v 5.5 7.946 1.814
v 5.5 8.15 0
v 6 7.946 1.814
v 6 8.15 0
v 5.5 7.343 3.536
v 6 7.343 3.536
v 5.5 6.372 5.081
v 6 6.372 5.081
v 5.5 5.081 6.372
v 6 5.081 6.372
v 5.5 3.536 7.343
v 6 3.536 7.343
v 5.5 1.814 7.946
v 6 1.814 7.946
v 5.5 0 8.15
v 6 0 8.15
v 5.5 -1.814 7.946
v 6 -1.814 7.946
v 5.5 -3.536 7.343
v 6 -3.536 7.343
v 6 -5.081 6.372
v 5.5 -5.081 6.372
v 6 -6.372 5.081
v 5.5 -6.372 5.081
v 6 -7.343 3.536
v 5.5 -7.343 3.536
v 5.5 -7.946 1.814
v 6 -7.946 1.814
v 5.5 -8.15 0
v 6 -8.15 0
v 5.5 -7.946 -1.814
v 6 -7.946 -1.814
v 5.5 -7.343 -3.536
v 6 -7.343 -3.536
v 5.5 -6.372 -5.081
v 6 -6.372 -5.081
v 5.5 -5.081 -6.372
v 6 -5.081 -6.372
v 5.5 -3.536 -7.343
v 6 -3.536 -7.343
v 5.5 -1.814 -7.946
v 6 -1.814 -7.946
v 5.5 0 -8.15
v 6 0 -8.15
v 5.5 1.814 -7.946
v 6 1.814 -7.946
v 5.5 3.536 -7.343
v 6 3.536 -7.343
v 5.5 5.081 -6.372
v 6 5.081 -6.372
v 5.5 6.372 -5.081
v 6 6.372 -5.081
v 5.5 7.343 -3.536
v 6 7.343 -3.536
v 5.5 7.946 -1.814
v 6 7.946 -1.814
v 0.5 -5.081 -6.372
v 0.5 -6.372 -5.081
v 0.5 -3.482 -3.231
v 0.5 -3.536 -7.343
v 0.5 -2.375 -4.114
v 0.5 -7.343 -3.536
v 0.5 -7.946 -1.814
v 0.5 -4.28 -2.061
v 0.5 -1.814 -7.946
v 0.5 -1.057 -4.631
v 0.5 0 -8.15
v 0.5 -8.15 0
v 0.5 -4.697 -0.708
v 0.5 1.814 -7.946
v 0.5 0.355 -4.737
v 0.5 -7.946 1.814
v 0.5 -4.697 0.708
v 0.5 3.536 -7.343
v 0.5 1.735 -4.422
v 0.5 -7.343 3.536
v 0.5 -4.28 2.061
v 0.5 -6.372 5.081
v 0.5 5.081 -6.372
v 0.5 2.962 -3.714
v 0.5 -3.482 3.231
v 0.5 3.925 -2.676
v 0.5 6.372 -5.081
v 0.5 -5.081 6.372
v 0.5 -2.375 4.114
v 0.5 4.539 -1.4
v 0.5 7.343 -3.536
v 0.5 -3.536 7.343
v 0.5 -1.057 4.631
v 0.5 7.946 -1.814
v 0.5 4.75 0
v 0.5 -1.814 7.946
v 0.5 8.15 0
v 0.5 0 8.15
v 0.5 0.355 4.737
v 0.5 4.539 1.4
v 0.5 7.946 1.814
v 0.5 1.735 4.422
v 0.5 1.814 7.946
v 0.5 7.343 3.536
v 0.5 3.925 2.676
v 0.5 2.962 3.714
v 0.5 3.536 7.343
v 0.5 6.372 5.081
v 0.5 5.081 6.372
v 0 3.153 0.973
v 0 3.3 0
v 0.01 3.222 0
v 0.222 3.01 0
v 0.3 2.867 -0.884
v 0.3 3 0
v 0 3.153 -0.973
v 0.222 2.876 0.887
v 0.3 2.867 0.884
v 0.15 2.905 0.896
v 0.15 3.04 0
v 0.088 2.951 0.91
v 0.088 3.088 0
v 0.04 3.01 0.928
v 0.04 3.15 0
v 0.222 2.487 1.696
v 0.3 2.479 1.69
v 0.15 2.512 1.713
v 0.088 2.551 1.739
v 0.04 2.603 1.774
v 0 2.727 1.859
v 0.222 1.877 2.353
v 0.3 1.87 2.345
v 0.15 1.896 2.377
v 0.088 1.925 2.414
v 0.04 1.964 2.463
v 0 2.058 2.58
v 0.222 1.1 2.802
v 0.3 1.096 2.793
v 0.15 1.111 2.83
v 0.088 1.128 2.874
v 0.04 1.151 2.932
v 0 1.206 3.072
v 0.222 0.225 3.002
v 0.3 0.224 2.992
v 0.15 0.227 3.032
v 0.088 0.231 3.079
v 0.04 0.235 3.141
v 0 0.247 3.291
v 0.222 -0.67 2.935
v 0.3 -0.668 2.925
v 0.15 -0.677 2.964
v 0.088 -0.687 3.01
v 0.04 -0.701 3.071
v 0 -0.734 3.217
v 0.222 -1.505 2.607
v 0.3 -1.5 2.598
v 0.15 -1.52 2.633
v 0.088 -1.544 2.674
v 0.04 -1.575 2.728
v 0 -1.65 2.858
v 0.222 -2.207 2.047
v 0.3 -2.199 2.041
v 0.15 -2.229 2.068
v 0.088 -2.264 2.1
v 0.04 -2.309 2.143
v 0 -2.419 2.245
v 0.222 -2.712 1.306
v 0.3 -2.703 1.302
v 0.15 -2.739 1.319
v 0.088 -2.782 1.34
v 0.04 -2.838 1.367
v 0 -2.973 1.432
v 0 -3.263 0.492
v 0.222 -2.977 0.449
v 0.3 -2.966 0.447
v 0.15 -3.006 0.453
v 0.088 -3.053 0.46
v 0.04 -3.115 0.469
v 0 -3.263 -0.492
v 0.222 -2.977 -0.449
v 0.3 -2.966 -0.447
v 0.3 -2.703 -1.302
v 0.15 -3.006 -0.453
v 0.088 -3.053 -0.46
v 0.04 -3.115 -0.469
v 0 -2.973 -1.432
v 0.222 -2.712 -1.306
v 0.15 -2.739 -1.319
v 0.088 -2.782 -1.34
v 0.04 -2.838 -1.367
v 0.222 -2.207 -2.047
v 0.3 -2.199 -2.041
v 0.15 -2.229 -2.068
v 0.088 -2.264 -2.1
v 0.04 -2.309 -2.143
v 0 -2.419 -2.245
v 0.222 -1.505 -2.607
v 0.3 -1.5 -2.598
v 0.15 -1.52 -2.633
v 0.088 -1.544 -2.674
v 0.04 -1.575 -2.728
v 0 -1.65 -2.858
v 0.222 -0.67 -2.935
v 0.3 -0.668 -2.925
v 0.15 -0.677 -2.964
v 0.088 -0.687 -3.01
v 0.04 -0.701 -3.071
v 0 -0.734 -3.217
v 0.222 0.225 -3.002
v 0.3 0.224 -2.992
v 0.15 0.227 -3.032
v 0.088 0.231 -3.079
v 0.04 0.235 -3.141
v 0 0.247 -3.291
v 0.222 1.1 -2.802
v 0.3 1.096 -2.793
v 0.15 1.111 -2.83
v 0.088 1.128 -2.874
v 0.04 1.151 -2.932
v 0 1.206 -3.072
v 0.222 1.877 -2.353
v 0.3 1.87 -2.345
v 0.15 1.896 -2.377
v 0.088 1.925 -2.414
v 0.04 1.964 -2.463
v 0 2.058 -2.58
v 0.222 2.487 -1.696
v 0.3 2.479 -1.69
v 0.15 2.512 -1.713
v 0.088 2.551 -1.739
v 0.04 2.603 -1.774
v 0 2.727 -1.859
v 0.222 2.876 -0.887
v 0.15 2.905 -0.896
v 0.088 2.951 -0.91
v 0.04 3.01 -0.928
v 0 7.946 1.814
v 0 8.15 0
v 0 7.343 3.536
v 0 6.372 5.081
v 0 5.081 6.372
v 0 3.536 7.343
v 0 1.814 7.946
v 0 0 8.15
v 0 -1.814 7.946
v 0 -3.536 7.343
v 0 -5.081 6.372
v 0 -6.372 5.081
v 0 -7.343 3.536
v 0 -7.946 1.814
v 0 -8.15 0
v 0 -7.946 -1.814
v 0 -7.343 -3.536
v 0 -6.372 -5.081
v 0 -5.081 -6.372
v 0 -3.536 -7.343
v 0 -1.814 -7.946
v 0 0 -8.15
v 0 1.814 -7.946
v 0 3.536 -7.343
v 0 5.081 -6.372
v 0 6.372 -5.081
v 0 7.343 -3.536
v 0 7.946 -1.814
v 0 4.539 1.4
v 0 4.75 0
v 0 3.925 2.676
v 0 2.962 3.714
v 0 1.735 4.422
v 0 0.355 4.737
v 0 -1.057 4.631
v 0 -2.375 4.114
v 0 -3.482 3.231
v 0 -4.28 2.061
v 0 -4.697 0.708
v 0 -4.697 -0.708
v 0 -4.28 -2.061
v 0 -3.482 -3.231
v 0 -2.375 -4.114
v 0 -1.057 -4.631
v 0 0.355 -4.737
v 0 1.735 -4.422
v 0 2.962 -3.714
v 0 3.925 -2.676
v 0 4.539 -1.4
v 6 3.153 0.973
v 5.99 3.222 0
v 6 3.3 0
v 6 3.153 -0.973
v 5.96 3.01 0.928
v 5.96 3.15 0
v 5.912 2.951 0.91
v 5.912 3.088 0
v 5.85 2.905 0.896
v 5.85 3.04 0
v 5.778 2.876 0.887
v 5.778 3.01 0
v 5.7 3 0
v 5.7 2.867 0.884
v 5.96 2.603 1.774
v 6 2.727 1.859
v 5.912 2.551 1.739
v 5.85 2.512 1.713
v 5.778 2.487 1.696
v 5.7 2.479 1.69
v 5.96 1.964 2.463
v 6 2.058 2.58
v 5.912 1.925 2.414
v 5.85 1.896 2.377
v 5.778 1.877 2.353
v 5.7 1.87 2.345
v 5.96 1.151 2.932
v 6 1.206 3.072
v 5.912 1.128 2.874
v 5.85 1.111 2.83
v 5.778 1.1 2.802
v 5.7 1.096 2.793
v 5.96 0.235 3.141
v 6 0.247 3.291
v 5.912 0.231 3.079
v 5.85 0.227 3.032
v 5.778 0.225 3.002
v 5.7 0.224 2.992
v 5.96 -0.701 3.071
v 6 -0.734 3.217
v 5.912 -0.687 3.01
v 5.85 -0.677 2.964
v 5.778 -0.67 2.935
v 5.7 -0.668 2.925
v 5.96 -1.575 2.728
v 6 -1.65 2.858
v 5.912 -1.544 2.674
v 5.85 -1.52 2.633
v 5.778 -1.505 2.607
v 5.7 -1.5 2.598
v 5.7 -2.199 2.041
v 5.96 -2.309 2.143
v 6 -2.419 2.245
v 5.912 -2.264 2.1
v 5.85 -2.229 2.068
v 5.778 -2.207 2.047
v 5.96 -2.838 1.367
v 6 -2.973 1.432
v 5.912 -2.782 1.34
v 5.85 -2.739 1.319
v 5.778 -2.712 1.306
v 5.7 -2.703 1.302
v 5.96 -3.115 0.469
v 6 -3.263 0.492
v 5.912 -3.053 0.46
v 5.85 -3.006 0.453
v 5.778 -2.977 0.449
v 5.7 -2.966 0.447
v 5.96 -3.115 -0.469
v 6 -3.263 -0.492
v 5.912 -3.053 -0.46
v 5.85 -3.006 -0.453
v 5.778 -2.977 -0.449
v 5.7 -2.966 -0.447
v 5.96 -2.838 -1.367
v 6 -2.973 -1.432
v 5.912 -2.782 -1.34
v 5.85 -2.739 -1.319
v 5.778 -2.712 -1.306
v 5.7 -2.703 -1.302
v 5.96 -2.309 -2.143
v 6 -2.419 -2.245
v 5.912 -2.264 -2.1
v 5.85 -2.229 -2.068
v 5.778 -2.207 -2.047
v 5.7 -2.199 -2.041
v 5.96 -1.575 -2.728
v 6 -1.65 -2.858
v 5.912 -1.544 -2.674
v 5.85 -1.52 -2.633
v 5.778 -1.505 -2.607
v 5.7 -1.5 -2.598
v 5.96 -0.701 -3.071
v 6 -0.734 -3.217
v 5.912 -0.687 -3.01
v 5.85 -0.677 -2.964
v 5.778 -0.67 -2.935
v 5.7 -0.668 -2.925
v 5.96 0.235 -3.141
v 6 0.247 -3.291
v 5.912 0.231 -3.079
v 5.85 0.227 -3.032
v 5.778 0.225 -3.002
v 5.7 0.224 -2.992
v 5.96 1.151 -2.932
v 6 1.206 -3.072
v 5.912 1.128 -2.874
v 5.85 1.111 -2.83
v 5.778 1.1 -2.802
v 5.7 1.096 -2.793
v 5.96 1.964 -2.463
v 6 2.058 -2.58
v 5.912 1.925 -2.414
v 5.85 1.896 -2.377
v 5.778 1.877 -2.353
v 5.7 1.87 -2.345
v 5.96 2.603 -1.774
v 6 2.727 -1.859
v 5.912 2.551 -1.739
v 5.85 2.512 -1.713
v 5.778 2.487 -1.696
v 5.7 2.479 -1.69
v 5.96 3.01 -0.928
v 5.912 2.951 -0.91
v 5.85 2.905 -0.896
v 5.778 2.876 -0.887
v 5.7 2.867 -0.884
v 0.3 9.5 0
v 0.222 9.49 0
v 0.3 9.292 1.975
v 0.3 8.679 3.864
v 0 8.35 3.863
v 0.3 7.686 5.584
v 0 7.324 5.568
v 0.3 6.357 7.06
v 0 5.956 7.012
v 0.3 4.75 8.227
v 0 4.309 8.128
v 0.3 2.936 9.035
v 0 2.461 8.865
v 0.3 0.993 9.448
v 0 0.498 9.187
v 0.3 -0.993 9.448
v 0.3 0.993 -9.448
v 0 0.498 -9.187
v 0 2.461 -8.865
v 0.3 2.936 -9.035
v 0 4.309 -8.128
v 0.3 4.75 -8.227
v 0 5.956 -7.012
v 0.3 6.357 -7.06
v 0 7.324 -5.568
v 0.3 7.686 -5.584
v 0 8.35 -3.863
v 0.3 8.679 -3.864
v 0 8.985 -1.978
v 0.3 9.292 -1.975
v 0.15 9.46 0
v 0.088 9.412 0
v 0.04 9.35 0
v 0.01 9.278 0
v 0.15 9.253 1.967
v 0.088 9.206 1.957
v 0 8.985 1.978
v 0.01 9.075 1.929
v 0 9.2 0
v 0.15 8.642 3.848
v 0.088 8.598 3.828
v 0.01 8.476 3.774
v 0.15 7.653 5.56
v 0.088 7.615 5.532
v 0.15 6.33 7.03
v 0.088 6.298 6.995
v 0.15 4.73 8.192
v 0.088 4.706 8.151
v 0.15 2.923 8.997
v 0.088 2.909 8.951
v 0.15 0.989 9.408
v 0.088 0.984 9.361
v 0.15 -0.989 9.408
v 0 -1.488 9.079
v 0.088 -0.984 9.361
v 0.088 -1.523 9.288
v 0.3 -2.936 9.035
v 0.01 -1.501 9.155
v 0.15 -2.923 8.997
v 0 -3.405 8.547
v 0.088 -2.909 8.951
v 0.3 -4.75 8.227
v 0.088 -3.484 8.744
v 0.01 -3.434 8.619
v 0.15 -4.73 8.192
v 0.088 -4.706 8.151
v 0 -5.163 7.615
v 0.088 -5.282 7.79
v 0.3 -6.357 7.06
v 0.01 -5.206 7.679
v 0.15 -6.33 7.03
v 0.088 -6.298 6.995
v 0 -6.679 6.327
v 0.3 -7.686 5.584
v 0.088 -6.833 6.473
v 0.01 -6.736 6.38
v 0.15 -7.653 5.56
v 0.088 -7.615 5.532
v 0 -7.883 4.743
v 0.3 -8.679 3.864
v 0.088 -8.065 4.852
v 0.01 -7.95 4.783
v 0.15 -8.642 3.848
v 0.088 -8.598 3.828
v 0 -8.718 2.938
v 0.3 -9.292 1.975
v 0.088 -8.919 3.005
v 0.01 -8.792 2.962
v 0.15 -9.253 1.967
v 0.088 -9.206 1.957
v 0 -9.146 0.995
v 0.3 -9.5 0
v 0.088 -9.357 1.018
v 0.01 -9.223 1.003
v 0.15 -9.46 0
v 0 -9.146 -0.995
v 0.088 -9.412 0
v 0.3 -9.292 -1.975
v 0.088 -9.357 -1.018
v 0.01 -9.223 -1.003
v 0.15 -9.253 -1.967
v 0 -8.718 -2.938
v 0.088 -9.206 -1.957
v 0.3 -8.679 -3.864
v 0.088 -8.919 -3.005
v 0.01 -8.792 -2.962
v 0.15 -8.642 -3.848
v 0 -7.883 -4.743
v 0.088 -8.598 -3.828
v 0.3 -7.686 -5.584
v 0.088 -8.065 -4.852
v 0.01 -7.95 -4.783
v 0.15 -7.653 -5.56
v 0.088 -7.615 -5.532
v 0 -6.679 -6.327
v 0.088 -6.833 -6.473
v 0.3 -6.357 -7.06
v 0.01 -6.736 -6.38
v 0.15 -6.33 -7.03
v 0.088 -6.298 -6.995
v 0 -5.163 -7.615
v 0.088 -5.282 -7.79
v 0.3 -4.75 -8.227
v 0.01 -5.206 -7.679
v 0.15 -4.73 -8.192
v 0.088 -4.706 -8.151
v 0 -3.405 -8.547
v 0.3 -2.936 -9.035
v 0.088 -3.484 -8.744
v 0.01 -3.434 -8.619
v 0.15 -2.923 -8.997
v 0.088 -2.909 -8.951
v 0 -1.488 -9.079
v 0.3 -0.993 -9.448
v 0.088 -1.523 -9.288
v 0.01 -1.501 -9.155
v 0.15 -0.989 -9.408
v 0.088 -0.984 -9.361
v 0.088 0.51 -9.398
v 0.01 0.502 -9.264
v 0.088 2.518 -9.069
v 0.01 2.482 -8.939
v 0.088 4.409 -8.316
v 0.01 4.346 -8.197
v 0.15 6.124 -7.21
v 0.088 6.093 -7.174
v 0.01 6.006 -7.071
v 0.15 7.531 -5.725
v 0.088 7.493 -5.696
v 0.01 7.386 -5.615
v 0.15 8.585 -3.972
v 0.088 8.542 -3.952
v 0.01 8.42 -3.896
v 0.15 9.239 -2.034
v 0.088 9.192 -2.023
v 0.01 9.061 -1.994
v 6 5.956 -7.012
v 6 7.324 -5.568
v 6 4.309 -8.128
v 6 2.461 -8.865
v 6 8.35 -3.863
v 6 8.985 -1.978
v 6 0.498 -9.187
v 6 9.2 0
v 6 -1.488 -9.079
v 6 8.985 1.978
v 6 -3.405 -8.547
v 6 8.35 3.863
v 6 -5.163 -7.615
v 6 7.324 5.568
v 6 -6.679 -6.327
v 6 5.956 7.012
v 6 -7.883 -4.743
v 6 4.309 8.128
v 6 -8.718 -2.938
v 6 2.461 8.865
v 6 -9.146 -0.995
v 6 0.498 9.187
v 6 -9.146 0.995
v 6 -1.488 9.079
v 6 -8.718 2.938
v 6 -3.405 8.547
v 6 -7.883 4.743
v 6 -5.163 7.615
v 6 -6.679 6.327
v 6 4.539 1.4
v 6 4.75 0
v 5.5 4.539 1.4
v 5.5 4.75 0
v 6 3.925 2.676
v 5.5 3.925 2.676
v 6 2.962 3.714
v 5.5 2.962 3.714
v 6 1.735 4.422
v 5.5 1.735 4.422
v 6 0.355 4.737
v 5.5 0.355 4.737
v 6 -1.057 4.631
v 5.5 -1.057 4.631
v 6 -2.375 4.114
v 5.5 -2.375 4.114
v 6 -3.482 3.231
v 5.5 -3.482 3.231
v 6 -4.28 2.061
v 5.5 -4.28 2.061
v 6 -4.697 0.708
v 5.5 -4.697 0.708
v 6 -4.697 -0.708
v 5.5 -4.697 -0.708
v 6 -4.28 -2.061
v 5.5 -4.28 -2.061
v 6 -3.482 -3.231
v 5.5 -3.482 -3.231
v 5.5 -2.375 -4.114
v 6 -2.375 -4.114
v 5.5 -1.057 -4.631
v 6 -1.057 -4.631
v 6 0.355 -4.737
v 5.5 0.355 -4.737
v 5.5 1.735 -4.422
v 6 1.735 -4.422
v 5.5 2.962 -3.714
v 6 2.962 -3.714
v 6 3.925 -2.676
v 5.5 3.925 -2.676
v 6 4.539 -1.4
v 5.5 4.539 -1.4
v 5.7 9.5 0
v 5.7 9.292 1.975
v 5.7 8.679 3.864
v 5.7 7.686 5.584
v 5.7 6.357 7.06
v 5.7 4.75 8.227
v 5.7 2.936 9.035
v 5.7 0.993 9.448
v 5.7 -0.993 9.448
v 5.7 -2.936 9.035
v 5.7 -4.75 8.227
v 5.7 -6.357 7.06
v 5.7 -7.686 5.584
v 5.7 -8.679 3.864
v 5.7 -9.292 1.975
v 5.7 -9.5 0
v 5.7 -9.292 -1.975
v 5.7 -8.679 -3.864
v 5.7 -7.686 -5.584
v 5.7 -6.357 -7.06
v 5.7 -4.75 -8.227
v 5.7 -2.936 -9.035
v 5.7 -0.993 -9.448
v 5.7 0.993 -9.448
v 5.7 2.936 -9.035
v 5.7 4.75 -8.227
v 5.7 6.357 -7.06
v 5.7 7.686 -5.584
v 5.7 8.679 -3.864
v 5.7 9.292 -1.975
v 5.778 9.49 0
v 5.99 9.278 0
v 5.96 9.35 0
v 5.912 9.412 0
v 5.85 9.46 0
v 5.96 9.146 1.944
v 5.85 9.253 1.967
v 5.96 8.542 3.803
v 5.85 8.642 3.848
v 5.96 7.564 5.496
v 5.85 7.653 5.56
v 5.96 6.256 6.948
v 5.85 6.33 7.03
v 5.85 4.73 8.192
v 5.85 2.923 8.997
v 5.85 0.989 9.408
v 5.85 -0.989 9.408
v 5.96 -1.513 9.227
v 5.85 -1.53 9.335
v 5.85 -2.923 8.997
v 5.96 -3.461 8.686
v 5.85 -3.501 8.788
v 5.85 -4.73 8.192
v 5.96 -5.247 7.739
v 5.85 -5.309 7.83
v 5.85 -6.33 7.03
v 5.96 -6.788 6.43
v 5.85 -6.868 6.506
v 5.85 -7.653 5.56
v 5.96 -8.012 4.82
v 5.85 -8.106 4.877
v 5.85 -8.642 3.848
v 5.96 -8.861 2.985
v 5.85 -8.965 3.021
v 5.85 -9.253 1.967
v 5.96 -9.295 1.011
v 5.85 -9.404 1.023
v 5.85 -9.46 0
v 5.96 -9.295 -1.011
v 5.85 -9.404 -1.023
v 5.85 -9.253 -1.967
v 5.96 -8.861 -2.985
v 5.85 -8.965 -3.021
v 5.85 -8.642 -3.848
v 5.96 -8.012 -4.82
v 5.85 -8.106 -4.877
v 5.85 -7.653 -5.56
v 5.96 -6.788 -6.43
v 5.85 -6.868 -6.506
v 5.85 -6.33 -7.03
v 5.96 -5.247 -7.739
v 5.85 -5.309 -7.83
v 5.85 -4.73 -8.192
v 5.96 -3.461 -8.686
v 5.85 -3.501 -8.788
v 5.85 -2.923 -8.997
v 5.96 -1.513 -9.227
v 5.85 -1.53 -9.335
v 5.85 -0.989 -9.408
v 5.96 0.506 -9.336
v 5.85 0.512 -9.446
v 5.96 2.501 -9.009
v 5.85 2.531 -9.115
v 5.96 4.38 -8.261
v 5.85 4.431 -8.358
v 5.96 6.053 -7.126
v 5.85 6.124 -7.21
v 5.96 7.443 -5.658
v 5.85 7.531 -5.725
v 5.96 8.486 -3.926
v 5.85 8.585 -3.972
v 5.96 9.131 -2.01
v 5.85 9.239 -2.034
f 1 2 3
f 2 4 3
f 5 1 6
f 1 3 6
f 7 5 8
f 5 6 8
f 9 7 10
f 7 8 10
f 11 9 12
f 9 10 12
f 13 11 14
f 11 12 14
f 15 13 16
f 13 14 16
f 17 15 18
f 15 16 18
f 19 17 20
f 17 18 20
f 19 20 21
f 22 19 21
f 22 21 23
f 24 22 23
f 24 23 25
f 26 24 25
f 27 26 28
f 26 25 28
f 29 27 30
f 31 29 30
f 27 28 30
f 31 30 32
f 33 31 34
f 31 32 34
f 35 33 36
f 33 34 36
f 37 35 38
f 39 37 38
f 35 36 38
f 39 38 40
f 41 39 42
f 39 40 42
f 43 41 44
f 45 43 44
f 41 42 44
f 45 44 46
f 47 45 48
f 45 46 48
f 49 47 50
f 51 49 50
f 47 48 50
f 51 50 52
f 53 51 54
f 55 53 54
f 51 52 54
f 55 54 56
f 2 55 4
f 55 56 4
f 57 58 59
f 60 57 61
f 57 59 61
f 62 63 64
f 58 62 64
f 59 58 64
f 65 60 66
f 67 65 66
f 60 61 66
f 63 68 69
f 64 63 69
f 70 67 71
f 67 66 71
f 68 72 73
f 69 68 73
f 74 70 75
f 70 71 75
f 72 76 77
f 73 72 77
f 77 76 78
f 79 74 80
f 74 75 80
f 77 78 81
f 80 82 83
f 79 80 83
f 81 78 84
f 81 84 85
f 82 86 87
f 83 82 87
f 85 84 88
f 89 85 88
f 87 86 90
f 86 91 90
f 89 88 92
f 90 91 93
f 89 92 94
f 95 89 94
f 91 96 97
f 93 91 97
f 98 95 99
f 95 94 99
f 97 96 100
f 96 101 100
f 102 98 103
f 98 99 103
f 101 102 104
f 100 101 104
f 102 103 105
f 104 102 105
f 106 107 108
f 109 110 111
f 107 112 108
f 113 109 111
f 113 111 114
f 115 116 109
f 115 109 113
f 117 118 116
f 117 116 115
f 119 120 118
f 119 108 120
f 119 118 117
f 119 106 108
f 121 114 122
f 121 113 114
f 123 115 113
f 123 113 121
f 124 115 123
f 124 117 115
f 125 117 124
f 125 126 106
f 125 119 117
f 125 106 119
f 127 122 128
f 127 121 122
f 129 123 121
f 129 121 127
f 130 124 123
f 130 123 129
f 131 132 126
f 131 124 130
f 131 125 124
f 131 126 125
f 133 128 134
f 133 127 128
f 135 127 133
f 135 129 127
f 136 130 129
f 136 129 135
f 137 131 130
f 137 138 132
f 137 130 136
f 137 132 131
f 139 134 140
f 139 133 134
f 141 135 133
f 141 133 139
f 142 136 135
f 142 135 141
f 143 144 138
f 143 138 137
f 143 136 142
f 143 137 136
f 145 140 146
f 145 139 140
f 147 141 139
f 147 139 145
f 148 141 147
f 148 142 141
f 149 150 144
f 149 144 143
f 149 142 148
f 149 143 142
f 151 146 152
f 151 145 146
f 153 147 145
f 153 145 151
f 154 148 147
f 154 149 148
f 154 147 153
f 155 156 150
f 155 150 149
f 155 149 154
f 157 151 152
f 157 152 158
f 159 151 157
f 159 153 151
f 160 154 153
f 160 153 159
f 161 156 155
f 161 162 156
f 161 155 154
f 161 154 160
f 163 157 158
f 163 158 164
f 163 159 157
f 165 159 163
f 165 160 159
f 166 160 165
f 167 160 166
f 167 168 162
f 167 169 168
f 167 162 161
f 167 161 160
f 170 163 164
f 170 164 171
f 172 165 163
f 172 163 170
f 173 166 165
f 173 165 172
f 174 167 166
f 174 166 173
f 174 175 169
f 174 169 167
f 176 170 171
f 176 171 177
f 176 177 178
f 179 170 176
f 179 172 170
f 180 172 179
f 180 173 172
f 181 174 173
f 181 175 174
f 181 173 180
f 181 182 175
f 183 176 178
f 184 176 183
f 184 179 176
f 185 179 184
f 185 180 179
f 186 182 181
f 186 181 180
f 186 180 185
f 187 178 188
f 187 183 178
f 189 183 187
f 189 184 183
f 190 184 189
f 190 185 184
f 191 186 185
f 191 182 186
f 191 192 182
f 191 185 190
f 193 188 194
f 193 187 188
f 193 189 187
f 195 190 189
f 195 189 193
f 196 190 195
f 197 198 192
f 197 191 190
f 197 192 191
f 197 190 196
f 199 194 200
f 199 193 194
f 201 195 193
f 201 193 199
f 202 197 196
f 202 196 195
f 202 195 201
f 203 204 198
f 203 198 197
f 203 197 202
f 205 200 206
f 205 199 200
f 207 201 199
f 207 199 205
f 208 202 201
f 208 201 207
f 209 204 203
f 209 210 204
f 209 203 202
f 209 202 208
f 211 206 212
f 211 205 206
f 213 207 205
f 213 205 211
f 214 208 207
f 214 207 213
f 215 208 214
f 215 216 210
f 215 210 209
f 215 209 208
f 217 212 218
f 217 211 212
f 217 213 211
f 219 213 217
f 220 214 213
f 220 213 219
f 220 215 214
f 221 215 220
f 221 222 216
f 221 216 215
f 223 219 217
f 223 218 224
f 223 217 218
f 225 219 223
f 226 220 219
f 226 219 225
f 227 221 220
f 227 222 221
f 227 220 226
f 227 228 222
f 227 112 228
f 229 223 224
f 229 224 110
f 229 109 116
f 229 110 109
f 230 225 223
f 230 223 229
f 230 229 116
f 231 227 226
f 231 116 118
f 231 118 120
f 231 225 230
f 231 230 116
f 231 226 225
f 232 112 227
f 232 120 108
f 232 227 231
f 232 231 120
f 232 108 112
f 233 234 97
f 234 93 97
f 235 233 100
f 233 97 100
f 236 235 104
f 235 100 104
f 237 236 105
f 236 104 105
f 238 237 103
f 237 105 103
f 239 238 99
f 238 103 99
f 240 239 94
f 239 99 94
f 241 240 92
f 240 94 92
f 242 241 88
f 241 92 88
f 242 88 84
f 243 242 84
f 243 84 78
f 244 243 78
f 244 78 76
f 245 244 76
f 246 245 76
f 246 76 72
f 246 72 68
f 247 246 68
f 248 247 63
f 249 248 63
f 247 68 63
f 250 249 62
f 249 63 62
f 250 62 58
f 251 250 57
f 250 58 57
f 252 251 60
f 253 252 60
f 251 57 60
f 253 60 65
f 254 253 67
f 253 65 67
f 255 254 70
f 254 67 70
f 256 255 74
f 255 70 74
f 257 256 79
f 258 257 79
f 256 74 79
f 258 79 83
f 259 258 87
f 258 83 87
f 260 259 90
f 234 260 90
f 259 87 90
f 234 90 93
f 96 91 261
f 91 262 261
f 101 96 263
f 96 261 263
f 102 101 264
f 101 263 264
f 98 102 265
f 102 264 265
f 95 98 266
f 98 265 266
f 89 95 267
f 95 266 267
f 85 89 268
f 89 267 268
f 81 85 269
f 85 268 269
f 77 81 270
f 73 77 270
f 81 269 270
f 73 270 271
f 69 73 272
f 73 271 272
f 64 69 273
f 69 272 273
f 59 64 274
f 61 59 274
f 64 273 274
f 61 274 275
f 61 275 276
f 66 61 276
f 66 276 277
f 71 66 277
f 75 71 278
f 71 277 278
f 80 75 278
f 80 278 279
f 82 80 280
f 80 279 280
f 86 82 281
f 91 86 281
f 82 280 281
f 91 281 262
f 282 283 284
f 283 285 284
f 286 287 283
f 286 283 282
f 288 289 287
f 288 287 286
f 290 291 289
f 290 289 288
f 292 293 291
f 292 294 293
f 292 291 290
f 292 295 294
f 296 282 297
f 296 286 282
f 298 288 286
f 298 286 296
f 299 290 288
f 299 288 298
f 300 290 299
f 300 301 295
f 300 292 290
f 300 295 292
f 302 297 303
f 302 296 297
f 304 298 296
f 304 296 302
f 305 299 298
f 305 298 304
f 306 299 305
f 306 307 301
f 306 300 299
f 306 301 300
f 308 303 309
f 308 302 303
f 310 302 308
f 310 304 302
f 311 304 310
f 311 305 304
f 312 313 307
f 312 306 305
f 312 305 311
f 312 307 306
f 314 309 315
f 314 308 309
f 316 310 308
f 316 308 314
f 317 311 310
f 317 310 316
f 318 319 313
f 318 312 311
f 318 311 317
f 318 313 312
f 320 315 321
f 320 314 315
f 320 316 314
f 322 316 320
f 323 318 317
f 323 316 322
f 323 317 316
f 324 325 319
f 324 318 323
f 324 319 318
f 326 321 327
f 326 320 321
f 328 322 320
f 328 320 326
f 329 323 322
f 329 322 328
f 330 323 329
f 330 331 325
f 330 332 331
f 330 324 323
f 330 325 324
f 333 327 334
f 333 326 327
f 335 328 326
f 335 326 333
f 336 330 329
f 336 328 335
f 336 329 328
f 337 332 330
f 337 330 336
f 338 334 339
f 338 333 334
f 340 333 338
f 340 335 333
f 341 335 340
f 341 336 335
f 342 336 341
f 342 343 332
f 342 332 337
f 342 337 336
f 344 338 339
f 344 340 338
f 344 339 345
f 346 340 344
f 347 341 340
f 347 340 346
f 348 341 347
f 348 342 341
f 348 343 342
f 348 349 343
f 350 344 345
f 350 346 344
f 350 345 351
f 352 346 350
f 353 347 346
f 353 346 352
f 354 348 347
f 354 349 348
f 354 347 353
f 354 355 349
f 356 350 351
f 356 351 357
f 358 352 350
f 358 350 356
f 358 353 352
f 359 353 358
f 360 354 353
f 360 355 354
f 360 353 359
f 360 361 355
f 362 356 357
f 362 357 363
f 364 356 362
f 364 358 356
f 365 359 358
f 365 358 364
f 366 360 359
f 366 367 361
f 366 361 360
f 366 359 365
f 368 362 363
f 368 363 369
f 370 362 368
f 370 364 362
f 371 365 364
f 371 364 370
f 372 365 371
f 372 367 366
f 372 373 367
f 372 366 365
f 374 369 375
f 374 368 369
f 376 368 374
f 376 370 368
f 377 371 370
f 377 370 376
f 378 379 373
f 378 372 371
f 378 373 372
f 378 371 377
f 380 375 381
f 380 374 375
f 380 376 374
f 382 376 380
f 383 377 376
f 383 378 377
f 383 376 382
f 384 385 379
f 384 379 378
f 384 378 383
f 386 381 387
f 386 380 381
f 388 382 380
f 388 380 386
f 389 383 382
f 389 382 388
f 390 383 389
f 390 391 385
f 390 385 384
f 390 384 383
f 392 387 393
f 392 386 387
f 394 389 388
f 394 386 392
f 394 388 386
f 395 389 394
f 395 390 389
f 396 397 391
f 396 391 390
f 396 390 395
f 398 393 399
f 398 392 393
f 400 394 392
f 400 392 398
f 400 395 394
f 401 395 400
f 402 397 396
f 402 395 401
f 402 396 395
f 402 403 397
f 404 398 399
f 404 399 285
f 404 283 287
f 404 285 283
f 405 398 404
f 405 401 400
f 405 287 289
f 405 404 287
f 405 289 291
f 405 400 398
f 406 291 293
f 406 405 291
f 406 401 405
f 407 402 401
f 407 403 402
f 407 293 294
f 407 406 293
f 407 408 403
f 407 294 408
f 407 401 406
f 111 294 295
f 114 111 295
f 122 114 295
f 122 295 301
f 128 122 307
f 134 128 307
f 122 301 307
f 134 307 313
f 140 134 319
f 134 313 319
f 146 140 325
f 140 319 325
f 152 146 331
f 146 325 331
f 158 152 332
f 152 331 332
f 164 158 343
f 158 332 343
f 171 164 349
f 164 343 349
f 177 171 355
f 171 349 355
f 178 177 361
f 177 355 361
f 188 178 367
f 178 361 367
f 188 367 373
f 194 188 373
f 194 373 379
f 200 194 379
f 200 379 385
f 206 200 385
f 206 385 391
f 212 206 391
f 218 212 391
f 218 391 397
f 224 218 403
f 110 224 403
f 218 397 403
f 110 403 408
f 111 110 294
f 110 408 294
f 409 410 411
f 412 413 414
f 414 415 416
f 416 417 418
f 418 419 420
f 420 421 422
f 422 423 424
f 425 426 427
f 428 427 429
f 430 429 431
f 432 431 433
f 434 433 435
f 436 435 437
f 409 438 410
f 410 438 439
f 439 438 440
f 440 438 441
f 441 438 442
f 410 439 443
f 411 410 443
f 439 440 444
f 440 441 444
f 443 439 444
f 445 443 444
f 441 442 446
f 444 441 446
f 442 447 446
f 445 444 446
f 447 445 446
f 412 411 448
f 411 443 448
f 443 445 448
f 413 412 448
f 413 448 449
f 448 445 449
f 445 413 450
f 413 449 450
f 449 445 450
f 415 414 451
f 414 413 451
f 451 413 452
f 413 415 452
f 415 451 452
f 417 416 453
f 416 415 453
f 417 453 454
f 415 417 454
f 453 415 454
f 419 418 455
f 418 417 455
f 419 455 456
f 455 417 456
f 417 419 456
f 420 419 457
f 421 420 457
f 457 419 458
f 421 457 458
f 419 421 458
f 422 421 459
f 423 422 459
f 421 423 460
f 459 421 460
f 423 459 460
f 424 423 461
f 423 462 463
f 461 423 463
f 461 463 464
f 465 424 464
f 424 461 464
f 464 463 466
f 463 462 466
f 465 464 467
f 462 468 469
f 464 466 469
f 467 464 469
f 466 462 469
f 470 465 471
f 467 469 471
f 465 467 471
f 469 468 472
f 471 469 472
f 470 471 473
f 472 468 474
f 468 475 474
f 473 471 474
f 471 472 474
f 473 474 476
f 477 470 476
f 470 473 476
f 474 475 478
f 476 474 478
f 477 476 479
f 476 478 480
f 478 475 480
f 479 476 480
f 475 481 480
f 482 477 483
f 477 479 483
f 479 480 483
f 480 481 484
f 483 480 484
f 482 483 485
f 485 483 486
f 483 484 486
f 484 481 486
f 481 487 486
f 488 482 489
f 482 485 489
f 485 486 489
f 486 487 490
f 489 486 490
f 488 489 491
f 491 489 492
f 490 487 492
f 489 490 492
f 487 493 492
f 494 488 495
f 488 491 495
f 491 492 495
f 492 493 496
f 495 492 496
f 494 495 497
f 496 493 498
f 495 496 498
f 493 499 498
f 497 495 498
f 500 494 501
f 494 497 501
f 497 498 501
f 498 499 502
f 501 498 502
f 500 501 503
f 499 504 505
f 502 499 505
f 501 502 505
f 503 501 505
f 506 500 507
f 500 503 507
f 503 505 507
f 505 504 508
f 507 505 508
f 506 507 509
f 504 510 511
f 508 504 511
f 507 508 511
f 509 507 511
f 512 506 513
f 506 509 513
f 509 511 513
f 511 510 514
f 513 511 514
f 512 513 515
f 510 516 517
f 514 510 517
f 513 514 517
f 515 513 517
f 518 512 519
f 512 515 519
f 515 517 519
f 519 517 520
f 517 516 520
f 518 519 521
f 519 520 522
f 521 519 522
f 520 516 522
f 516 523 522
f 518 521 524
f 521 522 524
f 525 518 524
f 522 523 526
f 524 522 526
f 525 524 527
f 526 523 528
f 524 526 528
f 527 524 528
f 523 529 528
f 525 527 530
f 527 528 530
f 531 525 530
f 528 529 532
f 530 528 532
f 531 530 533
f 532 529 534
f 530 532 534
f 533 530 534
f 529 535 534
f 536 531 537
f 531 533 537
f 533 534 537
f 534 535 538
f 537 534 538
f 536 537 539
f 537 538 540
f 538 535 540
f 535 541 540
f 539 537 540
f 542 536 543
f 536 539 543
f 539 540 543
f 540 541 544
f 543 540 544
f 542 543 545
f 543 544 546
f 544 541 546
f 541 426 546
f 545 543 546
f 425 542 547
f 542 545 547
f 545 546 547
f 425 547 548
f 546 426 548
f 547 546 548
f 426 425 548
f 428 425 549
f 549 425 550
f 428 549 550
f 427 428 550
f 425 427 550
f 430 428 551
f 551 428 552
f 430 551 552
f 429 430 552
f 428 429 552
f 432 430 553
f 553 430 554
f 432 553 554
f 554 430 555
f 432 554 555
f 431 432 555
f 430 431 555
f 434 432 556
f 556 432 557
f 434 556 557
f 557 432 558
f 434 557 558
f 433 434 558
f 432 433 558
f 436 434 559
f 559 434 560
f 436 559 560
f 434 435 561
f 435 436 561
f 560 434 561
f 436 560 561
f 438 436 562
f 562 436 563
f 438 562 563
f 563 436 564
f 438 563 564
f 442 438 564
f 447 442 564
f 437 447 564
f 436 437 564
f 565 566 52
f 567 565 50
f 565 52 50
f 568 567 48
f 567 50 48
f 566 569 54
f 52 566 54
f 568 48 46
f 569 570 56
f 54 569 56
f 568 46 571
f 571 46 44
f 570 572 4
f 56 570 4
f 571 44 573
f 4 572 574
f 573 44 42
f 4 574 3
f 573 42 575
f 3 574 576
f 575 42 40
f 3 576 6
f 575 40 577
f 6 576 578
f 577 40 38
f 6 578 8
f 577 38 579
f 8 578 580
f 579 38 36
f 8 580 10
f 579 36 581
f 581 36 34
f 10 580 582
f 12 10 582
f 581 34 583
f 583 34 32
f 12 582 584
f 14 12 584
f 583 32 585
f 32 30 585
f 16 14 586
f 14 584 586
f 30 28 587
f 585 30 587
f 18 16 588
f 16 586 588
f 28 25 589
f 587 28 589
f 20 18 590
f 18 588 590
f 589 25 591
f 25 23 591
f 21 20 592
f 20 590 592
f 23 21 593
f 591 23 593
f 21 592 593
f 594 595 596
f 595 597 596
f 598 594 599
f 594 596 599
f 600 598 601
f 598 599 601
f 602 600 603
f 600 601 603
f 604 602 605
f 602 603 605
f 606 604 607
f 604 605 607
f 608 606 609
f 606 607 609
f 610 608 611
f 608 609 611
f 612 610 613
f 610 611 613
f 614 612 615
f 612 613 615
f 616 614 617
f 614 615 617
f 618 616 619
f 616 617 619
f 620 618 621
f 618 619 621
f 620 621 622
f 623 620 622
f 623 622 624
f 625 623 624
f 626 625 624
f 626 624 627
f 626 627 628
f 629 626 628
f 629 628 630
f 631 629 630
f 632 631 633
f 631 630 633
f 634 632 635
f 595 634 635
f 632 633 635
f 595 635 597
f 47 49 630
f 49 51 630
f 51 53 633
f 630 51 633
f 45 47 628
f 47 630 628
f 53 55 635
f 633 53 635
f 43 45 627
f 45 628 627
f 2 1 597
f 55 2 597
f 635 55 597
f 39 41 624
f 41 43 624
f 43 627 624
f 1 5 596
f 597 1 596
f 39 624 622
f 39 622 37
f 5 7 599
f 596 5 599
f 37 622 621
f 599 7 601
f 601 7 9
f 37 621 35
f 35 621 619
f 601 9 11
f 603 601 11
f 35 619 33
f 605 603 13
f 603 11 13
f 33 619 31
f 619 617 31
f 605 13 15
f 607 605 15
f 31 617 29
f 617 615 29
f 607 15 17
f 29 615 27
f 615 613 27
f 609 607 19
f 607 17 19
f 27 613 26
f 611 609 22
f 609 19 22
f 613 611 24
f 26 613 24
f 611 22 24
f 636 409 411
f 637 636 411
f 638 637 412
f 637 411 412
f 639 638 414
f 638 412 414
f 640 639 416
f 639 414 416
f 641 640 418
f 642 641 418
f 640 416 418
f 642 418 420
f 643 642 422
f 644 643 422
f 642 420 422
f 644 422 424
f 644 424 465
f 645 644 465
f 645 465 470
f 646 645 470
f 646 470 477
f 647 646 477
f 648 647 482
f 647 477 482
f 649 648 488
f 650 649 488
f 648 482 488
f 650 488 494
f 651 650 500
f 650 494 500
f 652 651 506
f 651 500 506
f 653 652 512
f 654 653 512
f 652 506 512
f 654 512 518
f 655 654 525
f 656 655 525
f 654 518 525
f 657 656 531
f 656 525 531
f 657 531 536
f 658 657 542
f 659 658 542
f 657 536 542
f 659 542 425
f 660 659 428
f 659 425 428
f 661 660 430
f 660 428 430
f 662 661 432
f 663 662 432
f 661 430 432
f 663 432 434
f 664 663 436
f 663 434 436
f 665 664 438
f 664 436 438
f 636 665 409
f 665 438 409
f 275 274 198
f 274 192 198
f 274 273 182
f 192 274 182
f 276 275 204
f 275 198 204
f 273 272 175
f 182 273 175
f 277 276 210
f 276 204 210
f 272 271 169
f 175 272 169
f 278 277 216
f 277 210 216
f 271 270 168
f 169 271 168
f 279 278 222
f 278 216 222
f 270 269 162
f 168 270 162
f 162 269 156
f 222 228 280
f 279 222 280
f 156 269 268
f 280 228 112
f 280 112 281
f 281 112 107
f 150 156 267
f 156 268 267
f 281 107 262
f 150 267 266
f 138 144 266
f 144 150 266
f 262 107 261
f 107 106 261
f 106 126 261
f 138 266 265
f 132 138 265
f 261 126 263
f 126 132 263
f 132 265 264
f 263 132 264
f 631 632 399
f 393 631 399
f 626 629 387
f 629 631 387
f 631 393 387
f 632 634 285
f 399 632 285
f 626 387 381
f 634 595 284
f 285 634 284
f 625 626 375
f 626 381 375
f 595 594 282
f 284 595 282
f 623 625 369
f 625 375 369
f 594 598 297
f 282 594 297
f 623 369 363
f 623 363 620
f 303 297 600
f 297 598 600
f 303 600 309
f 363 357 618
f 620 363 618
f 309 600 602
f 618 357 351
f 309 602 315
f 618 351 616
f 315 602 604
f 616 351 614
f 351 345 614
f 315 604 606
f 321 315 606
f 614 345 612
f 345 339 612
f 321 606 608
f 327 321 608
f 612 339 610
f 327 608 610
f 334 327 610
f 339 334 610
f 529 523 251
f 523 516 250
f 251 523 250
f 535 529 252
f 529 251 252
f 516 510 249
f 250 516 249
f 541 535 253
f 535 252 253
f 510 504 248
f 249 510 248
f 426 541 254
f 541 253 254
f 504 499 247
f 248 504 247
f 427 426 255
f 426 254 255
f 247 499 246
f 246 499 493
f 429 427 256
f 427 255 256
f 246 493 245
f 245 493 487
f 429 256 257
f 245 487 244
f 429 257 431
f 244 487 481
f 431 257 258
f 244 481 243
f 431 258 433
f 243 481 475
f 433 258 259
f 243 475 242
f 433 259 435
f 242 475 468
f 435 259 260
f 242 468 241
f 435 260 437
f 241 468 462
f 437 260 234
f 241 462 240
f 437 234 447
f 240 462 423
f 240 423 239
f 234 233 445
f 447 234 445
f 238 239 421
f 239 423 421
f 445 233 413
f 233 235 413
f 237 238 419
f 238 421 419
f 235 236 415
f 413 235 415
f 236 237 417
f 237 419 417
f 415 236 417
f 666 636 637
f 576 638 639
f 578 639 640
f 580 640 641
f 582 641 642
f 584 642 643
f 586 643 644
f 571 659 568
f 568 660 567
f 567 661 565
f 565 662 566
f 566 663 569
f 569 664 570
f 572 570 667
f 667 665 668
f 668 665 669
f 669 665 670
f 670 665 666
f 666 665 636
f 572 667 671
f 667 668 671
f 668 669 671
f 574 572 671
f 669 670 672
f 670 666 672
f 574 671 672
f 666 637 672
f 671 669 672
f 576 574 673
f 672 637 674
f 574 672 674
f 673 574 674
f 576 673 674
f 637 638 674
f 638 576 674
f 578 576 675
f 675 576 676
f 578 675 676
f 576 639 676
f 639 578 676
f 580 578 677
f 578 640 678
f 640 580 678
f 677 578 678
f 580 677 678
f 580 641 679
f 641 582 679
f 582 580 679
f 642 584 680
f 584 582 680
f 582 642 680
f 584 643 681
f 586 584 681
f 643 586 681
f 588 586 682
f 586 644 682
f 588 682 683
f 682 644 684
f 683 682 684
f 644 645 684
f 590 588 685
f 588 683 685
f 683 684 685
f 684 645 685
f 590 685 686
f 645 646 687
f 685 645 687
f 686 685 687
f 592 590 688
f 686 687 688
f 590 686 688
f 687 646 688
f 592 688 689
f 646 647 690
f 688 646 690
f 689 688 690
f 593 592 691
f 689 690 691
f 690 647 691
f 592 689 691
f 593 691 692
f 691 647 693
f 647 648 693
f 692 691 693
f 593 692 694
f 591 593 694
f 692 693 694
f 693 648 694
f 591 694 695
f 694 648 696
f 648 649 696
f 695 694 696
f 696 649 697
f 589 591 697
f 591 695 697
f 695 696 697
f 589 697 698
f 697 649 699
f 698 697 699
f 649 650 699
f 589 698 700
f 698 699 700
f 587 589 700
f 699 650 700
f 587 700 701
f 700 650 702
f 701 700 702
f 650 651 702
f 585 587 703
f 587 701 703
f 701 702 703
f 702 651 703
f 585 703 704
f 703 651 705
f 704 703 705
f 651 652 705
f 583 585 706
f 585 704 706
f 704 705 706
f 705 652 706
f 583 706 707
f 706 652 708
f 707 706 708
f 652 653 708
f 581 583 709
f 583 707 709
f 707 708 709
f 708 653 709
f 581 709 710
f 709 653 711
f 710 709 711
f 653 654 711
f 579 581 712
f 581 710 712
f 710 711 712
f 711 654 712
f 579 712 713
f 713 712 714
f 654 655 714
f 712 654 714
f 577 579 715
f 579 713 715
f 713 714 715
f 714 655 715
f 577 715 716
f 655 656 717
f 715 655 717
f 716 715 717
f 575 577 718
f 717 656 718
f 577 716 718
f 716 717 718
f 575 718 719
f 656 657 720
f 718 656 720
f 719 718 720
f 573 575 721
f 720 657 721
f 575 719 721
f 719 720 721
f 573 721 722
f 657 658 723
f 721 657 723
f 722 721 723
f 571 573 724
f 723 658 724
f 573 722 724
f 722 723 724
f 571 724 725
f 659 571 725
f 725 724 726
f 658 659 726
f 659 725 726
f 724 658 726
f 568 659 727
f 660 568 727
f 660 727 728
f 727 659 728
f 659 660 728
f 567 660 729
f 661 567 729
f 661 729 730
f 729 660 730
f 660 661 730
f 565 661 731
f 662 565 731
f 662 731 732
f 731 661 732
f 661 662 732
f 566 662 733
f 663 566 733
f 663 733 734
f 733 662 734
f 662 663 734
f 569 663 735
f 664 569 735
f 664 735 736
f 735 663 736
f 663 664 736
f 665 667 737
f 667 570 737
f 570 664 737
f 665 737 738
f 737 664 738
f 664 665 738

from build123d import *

# Parameters (mm, degrees)
FILLET1_R = 0.3
FILLET2_R = 0.3


with BuildPart() as part:
    # Sketch1 → Revolve1 (revolve)
    with BuildSketch(Plane.XY):
        Polygon((0, 3), (6, 3), (6, 4.75), (5.5, 4.75), (5.5, 8.15), (6, 8.15), (6, 9.5), (0, 9.5), (0, 8.15), (0.5, 8.15), (0.5, 4.75), (0, 4.75), align=None)
    revolve(axis=Axis((0, 0, 0), (1, 0, 0)))

    # Fillet1
    fillet1_edges = [part.edges().sort_by_distance(p)[0] for p in [
        (0, -9.5, 0),
        (6, -9.5, 0),
    ]]
    fillet(fillet1_edges, radius=FILLET1_R)

    # Fillet2
    fillet2_edges = [part.edges().sort_by_distance(p)[0] for p in [
        (6, -3, 0),
        (0, -3, 0),
    ]]
    fillet(fillet2_edges, radius=FILLET2_R)


solid = part.part
